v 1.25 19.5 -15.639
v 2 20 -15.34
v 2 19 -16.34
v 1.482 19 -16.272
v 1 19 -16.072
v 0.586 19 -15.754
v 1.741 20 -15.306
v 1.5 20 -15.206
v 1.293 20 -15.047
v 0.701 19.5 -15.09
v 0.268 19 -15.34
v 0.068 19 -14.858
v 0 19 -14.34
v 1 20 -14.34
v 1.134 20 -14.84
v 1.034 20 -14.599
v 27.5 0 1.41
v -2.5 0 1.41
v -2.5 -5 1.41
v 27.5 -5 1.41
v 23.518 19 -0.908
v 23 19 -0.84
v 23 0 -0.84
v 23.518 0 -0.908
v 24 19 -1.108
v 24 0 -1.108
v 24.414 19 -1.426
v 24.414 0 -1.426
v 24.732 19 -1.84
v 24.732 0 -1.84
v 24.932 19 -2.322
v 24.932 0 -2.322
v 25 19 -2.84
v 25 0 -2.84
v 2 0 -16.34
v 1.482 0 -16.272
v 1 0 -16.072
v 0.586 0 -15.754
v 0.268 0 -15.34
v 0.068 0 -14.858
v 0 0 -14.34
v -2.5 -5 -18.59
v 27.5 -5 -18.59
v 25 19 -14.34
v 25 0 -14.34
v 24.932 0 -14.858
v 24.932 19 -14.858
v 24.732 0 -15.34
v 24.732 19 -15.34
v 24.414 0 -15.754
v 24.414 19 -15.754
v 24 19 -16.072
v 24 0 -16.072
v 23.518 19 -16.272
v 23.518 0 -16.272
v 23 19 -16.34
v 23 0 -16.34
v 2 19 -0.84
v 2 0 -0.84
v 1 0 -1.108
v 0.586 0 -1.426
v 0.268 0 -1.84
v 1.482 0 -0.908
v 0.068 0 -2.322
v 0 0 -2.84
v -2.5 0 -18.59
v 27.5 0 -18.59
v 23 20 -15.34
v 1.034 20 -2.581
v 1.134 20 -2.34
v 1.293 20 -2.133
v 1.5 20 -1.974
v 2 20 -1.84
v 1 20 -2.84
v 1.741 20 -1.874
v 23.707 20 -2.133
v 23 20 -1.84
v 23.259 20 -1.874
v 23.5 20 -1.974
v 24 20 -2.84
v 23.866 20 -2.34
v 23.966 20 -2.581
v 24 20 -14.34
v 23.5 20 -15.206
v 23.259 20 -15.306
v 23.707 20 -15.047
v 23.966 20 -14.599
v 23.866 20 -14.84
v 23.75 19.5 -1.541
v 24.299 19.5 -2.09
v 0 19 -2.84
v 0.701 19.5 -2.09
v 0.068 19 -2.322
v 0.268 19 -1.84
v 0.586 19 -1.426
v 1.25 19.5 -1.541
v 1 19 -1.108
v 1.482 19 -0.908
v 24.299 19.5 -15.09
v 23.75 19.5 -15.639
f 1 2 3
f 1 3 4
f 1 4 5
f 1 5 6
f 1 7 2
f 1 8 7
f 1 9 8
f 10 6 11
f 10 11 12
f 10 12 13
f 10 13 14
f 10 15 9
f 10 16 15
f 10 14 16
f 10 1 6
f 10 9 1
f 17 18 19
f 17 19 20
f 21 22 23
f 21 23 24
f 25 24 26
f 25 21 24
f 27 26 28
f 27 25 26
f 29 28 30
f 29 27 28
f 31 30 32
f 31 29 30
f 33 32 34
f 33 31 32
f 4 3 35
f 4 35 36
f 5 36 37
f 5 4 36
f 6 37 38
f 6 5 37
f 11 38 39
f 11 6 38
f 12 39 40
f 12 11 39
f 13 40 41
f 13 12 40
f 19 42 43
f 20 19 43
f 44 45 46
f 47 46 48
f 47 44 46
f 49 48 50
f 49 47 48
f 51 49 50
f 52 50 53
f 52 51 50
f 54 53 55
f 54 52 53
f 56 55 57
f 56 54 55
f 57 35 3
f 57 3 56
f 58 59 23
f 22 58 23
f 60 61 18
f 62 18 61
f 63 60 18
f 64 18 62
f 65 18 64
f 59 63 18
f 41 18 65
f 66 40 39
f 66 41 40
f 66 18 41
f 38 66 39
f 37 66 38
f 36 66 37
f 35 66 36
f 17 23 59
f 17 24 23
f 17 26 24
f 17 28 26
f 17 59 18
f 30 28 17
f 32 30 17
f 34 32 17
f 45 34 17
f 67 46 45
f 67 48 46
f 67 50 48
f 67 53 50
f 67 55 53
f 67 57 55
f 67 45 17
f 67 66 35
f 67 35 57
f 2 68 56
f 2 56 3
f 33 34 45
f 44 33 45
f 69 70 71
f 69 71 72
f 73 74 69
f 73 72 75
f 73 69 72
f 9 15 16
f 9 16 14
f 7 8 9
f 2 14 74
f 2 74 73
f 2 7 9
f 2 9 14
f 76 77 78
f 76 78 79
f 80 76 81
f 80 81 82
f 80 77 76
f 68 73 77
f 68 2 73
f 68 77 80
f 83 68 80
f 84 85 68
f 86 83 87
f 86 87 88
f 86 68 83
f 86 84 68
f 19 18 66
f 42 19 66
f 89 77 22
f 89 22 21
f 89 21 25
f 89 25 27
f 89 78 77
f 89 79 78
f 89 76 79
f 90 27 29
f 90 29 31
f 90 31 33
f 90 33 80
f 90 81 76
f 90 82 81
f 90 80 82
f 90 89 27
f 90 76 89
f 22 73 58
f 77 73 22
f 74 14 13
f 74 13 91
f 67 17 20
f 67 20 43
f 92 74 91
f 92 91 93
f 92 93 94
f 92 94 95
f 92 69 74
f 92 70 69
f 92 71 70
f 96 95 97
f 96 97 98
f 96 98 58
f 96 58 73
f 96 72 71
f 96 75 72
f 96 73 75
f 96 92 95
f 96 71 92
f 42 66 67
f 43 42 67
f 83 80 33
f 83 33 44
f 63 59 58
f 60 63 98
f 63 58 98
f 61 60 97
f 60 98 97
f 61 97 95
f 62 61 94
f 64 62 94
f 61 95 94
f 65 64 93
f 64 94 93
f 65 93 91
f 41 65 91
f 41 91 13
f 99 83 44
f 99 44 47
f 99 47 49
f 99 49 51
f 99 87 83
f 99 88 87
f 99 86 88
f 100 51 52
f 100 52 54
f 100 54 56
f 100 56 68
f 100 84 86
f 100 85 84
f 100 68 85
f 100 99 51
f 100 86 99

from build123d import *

# Parameters (mm, degrees)
JIG_SKETCH_W   = 25
JIG_SKETCH_H   = 15.5
INSERT_DEPTH   = 20
SKETCH1_3_W    = 30
SKETCH1_3_H    = 20
BASE_DEPTH     = 5
ROUND_EDGES_R  = 2
CHAMFER_2_SIZE = 1


with BuildPart() as part:
    # jig_sketch → insert (new body)
    with BuildSketch(Plane(origin=(0, 0, 0), x_dir=(1, 0, 0), z_dir=(0, 1, 0))):
        with Locations((12.5, 8.590078954)):
            Rectangle(JIG_SKETCH_W, JIG_SKETCH_H)
    extrude(amount=INSERT_DEPTH)

    # Sketch1<3> → base (add)
    with BuildSketch(Plane(origin=(0, 0, 0), x_dir=(1, 0, 0), z_dir=(0, 1, 0))):
        with Locations((12.5, 8.590078954)):
            Rectangle(SKETCH1_3_W, SKETCH1_3_H)
    extrude(amount=-BASE_DEPTH)

    # round_edges
    round_edges_edges = [part.edges().sort_by_distance(p)[0] for p in [
        (0, 10, -0.840078954),
        (0, 10, -16.340078954),
        (25, 10, -16.340078954),
        (25, 10, -0.840078954),
    ]]
    fillet(round_edges_edges, radius=ROUND_EDGES_R)

    # chamfer 2
    chamfer_2_edges = [part.edges().sort_by_distance(p)[0] for p in [
        (25, 20, -8.590078954),
        (12.5, 20, -0.840078954),
        (12.5, 20, -16.340078954),
        (0, 20, -8.590078954),
        (0.585786438, 20, -1.425865392),
        (0.585786438, 20, -15.754292517),
        (24.414213562, 20, -15.754292517),
        (24.414213562, 20, -1.425865392),
    ]]
    chamfer(chamfer_2_edges, length=CHAMFER_2_SIZE)


solid = part.part
